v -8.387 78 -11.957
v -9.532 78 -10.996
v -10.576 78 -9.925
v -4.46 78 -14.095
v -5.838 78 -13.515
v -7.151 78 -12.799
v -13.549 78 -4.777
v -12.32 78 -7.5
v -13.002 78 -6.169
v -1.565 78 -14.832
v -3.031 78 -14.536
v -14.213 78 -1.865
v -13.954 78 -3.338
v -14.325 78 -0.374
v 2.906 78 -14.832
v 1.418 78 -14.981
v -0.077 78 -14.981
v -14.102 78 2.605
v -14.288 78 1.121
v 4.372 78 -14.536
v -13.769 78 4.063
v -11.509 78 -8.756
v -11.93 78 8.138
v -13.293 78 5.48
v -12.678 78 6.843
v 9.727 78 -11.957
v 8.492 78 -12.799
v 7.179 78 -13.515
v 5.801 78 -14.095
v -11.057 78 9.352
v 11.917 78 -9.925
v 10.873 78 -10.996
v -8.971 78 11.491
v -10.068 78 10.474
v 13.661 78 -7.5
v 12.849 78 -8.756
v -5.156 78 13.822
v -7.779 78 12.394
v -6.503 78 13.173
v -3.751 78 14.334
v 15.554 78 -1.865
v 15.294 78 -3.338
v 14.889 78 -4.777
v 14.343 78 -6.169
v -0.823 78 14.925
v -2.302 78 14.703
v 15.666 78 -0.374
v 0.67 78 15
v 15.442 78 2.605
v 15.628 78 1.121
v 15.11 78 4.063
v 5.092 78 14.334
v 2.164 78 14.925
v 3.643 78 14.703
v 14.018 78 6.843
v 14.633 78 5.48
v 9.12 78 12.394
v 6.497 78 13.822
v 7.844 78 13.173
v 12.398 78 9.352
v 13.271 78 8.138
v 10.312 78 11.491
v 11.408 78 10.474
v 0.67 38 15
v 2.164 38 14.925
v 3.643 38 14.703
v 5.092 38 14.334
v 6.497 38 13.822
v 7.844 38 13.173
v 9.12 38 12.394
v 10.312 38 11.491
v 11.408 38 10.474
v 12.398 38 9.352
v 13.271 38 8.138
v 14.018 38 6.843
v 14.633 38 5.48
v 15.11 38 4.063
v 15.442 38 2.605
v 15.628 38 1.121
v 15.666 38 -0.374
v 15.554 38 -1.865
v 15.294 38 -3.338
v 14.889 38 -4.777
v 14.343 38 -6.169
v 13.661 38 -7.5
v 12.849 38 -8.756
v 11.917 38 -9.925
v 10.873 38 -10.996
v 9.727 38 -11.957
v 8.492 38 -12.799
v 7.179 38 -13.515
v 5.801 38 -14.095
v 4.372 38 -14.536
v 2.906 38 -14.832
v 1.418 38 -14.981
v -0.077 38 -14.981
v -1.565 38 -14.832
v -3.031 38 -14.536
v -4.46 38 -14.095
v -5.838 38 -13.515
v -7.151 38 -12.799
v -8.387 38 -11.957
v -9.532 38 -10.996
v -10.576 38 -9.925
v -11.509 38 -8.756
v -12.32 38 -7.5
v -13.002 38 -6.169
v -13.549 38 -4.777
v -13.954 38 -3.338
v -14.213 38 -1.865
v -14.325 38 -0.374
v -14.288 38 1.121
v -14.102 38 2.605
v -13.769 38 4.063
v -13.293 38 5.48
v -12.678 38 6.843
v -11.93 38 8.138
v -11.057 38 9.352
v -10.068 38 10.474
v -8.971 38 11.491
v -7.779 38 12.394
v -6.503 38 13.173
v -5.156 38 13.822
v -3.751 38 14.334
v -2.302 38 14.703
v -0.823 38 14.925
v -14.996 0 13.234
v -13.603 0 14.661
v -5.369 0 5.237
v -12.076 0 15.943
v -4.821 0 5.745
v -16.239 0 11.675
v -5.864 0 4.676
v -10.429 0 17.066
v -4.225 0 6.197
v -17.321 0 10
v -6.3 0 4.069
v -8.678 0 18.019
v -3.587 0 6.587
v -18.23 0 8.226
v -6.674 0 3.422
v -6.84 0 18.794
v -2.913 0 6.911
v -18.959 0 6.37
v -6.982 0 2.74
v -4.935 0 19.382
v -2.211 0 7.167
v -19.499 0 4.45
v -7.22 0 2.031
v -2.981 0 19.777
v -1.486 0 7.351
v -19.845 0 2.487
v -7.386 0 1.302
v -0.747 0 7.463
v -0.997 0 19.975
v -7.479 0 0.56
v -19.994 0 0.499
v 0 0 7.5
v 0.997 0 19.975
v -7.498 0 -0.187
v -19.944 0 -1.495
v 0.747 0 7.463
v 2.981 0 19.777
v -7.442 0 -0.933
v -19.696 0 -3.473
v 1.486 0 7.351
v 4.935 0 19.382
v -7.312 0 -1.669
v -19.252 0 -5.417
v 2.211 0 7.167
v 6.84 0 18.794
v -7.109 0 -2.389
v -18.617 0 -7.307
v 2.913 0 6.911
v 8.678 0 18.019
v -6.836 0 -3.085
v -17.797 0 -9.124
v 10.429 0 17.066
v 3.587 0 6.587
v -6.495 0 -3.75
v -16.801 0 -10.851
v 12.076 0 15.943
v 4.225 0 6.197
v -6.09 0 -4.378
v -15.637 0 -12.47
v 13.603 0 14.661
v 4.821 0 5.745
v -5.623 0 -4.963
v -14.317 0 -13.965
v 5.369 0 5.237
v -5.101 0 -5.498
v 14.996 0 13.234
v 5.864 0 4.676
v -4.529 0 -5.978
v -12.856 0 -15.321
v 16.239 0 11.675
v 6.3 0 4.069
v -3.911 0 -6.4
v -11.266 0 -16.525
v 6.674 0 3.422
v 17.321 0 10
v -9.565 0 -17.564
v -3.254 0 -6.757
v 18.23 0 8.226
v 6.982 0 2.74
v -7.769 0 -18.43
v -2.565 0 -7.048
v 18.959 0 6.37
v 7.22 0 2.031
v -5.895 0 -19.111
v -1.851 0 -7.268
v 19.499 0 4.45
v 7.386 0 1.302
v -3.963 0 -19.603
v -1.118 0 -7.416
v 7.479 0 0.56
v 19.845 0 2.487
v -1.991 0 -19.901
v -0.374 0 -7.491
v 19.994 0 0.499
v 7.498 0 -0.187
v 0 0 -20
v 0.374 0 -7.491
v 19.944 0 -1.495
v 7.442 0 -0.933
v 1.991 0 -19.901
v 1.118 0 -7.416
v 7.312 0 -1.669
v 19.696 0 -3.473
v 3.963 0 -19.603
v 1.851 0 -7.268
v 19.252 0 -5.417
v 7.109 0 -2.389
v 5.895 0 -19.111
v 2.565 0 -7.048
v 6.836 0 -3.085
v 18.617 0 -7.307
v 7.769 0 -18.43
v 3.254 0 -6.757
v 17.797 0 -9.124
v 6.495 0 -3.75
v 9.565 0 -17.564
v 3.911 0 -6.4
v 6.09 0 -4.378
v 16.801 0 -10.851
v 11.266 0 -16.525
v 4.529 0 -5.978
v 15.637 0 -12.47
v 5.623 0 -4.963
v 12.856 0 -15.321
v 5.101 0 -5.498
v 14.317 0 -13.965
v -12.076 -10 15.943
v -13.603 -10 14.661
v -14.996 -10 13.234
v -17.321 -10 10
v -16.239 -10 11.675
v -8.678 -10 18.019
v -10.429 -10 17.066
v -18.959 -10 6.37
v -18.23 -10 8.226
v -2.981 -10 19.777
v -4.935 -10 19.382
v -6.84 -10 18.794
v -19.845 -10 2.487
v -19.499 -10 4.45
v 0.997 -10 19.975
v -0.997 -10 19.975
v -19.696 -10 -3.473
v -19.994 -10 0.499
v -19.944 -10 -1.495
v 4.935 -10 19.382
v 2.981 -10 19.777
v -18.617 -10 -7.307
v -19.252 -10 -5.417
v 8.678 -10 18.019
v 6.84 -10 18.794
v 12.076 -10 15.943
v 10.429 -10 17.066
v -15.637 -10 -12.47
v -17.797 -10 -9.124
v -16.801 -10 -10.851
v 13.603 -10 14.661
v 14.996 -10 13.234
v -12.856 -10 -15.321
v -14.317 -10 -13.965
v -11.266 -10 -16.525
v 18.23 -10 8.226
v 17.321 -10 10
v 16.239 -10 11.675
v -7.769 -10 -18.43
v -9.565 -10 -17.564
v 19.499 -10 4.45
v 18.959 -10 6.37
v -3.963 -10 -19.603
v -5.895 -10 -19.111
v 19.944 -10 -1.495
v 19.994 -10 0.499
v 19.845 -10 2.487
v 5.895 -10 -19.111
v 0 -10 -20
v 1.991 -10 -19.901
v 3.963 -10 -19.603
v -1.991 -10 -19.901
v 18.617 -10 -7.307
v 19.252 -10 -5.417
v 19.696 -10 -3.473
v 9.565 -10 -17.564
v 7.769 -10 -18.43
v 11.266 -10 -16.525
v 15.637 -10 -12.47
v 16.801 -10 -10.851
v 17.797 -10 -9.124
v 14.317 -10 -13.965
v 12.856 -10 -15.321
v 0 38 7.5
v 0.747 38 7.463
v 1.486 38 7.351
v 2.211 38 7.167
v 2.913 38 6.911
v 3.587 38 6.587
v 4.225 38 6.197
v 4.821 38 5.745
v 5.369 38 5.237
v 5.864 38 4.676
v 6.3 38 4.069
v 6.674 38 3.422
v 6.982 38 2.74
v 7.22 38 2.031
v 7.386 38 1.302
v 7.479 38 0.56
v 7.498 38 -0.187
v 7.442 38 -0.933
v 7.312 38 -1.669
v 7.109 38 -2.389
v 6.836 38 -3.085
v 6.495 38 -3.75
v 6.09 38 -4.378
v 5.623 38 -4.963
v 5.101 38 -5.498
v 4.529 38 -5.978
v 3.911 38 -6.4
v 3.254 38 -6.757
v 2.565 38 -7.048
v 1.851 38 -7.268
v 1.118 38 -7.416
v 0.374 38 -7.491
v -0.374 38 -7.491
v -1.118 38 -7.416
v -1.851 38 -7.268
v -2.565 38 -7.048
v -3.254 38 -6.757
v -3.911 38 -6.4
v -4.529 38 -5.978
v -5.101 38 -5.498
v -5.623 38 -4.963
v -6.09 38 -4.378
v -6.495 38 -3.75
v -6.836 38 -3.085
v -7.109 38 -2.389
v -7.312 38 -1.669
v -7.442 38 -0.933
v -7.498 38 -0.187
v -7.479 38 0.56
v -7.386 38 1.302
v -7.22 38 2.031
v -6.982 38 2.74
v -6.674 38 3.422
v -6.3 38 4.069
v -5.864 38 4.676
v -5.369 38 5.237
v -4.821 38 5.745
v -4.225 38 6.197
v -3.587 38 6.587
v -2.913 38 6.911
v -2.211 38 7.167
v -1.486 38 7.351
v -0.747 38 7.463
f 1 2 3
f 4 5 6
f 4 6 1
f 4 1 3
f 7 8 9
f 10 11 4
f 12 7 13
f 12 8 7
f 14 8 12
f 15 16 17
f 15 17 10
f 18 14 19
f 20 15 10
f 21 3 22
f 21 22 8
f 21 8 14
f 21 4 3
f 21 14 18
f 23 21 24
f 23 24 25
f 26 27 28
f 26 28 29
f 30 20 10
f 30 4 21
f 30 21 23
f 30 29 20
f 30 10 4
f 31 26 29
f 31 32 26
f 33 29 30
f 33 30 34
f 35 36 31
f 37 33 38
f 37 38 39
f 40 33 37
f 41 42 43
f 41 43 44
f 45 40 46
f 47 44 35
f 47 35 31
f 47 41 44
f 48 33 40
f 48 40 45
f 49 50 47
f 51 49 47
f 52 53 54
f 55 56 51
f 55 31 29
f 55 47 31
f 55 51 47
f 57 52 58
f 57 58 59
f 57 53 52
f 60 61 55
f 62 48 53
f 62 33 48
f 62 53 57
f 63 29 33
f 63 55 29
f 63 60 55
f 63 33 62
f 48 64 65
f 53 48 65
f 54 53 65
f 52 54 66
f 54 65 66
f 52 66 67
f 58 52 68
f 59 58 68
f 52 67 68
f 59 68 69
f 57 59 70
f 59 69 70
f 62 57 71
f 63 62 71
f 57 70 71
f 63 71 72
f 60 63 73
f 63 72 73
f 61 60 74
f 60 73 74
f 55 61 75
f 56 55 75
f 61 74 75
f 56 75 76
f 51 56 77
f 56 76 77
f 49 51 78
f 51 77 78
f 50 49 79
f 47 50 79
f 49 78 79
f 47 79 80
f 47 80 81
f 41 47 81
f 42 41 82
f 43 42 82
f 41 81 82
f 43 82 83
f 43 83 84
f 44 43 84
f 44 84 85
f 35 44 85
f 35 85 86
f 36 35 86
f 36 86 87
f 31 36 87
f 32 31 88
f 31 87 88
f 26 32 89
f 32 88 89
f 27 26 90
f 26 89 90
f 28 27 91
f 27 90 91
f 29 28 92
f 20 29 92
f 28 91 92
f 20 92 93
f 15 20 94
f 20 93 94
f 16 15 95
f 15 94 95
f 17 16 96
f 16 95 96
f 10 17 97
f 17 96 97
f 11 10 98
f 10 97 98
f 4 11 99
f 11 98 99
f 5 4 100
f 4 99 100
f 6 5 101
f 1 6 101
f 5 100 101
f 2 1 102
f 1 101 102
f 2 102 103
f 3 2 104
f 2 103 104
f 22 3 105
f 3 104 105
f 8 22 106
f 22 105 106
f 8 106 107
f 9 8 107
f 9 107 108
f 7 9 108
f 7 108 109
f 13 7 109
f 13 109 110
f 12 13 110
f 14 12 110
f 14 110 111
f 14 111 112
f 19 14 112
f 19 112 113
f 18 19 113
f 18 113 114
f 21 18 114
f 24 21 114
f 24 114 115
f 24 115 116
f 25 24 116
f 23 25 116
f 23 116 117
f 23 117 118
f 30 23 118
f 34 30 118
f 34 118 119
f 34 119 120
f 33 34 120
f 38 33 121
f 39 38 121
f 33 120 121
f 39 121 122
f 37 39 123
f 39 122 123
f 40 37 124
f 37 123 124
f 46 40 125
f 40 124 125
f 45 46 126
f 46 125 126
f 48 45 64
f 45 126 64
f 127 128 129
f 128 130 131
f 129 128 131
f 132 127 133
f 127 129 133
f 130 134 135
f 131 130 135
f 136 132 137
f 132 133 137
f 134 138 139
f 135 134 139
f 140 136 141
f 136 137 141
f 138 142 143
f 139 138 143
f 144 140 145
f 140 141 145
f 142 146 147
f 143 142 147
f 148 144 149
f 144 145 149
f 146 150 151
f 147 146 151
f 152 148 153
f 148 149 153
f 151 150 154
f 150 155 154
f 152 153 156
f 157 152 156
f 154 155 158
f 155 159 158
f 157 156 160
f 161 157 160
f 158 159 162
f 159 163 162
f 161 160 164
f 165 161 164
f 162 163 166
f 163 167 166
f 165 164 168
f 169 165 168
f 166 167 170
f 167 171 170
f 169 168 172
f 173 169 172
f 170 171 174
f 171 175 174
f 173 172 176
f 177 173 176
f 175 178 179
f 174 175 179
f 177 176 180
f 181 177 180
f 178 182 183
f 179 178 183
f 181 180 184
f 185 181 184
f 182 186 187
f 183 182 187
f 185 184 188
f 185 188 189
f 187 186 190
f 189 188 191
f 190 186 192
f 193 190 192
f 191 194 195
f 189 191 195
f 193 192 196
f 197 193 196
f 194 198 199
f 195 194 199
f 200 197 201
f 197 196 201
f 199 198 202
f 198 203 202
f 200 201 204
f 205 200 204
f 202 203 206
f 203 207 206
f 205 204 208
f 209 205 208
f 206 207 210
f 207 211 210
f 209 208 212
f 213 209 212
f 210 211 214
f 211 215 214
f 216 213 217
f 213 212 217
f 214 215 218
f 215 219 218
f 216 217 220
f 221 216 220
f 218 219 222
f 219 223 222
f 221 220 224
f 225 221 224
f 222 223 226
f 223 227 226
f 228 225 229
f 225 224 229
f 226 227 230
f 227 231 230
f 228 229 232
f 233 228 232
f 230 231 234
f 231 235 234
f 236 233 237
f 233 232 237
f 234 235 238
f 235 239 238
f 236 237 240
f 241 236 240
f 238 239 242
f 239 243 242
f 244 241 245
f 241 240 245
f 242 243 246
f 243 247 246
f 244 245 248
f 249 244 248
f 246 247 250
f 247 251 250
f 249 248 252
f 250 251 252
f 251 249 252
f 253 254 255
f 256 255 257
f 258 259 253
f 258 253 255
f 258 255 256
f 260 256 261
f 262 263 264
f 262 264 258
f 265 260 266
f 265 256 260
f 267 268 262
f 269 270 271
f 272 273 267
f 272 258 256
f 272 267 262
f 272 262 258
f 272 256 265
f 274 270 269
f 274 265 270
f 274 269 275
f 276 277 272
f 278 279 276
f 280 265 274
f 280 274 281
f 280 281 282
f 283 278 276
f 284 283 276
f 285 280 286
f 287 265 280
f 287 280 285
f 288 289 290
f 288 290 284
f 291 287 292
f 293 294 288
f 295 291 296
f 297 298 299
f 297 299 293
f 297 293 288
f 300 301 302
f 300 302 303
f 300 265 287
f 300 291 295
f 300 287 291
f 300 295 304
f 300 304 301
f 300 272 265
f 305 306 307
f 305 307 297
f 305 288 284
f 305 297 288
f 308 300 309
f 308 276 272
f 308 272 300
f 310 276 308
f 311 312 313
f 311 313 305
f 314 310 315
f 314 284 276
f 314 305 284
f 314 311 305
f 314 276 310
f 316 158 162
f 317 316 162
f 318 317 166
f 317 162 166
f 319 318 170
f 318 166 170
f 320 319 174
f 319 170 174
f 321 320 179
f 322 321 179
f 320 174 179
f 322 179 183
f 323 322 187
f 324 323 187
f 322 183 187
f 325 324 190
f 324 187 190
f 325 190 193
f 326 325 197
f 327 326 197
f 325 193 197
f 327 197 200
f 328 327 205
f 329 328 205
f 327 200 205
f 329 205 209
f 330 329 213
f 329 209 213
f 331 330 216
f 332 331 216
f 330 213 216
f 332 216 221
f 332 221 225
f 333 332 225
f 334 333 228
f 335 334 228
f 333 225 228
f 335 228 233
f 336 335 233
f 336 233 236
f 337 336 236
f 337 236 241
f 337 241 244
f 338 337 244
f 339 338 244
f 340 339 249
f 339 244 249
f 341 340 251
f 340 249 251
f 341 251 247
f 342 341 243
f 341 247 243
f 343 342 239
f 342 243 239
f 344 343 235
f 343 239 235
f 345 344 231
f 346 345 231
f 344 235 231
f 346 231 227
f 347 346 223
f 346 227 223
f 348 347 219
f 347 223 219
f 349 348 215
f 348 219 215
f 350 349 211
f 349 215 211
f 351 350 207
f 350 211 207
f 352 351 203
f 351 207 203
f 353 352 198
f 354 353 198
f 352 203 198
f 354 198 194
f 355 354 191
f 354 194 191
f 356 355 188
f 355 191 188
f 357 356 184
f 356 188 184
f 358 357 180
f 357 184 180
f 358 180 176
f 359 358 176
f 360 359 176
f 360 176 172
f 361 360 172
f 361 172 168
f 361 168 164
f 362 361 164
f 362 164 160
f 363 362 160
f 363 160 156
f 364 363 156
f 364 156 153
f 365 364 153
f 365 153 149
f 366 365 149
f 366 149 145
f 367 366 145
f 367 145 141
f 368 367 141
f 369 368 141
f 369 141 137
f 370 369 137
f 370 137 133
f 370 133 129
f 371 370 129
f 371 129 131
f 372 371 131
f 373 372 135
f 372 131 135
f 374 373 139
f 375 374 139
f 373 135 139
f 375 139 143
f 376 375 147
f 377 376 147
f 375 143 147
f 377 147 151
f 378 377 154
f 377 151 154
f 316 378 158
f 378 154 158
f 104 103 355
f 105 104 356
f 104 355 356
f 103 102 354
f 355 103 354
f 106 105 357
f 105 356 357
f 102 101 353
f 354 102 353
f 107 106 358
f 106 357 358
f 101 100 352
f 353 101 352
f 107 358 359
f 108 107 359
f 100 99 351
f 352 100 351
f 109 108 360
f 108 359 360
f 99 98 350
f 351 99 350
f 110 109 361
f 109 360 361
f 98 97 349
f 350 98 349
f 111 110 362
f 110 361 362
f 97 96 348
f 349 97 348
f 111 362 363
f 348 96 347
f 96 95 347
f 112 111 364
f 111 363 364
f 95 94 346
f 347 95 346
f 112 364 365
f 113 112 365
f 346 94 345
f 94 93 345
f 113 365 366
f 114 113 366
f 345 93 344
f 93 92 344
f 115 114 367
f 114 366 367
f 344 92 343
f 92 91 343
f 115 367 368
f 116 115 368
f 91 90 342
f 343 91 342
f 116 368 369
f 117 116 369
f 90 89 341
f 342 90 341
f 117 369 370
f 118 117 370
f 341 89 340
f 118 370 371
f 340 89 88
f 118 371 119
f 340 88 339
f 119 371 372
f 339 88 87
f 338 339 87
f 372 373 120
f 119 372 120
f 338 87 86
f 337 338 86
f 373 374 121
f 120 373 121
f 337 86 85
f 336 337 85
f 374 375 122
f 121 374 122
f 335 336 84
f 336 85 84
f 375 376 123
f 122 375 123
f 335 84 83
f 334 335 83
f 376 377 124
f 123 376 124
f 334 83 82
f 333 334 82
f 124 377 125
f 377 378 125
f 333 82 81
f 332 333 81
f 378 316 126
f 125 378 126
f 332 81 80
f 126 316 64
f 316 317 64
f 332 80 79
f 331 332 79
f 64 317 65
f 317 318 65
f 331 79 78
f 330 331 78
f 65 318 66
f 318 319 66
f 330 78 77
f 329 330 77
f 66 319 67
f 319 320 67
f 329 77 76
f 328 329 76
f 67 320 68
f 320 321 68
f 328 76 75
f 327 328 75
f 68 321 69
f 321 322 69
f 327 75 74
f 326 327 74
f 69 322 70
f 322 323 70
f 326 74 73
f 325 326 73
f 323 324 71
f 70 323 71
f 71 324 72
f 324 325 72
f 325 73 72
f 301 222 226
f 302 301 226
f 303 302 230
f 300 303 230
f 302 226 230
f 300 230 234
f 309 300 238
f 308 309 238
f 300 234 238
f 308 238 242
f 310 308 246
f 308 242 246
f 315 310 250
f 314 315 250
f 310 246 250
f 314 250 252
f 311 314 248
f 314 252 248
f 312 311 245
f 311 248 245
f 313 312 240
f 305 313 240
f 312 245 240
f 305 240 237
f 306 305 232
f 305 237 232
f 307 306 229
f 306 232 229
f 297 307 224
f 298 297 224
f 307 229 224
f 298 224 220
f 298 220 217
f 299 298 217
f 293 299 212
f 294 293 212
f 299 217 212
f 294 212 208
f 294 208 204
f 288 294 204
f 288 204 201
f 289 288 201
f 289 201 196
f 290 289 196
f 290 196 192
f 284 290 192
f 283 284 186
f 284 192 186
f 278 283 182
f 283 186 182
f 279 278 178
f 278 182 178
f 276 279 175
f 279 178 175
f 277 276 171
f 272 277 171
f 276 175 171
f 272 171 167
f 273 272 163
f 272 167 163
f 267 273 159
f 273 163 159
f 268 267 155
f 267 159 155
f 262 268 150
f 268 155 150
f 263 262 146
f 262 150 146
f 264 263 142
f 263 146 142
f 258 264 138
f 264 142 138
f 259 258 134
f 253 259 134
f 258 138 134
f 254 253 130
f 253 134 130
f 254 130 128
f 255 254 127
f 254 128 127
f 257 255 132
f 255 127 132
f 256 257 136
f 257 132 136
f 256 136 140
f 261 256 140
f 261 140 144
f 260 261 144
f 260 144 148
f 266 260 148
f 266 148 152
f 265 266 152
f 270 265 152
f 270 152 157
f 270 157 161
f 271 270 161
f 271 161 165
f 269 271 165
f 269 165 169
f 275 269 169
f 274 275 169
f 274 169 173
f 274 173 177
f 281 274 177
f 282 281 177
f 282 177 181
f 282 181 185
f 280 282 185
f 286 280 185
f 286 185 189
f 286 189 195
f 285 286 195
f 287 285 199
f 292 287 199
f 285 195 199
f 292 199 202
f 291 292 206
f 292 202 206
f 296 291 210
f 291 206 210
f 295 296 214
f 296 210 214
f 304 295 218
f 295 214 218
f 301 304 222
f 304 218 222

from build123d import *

# Parameters (mm, degrees)
SKETCH1_R           = 7.5
BOSS_EXTRUDE1_DEPTH = 38
SKETCH2_R           = 20
BOSS_EXTRUDE2_DEPTH = 10
SKETCH3_R           = 15
BOSS_EXTRUDE3_DEPTH = 40


with BuildPart() as part:
    # Sketch1 → Boss-Extrude1 (new body)
    with BuildSketch(Plane(origin=(0, 0, 0), x_dir=(1, 0, 0), z_dir=(0, 1, 0))):
        with Locations(Location((0, 0, 0), (0, 0, 270))):
            Circle(SKETCH1_R)
    extrude(amount=BOSS_EXTRUDE1_DEPTH)

    # Sketch2 → Boss-Extrude2 (add)
    with BuildSketch(Plane.XZ):
        with Locations(Location((0, 0, 0), (0, 0, 270))):
            Circle(SKETCH2_R)
    extrude(amount=BOSS_EXTRUDE2_DEPTH)

    # Sketch3 → Boss-Extrude3 (add)
    with BuildSketch(Plane(origin=(0, 38, 0), x_dir=(1, 0, 0), z_dir=(0, 1, 0))):
        with Locations(Location((0.670369296, 0, 0), (0, 0, 270))):
            Circle(SKETCH3_R)
    extrude(amount=BOSS_EXTRUDE3_DEPTH)


solid = part.part
